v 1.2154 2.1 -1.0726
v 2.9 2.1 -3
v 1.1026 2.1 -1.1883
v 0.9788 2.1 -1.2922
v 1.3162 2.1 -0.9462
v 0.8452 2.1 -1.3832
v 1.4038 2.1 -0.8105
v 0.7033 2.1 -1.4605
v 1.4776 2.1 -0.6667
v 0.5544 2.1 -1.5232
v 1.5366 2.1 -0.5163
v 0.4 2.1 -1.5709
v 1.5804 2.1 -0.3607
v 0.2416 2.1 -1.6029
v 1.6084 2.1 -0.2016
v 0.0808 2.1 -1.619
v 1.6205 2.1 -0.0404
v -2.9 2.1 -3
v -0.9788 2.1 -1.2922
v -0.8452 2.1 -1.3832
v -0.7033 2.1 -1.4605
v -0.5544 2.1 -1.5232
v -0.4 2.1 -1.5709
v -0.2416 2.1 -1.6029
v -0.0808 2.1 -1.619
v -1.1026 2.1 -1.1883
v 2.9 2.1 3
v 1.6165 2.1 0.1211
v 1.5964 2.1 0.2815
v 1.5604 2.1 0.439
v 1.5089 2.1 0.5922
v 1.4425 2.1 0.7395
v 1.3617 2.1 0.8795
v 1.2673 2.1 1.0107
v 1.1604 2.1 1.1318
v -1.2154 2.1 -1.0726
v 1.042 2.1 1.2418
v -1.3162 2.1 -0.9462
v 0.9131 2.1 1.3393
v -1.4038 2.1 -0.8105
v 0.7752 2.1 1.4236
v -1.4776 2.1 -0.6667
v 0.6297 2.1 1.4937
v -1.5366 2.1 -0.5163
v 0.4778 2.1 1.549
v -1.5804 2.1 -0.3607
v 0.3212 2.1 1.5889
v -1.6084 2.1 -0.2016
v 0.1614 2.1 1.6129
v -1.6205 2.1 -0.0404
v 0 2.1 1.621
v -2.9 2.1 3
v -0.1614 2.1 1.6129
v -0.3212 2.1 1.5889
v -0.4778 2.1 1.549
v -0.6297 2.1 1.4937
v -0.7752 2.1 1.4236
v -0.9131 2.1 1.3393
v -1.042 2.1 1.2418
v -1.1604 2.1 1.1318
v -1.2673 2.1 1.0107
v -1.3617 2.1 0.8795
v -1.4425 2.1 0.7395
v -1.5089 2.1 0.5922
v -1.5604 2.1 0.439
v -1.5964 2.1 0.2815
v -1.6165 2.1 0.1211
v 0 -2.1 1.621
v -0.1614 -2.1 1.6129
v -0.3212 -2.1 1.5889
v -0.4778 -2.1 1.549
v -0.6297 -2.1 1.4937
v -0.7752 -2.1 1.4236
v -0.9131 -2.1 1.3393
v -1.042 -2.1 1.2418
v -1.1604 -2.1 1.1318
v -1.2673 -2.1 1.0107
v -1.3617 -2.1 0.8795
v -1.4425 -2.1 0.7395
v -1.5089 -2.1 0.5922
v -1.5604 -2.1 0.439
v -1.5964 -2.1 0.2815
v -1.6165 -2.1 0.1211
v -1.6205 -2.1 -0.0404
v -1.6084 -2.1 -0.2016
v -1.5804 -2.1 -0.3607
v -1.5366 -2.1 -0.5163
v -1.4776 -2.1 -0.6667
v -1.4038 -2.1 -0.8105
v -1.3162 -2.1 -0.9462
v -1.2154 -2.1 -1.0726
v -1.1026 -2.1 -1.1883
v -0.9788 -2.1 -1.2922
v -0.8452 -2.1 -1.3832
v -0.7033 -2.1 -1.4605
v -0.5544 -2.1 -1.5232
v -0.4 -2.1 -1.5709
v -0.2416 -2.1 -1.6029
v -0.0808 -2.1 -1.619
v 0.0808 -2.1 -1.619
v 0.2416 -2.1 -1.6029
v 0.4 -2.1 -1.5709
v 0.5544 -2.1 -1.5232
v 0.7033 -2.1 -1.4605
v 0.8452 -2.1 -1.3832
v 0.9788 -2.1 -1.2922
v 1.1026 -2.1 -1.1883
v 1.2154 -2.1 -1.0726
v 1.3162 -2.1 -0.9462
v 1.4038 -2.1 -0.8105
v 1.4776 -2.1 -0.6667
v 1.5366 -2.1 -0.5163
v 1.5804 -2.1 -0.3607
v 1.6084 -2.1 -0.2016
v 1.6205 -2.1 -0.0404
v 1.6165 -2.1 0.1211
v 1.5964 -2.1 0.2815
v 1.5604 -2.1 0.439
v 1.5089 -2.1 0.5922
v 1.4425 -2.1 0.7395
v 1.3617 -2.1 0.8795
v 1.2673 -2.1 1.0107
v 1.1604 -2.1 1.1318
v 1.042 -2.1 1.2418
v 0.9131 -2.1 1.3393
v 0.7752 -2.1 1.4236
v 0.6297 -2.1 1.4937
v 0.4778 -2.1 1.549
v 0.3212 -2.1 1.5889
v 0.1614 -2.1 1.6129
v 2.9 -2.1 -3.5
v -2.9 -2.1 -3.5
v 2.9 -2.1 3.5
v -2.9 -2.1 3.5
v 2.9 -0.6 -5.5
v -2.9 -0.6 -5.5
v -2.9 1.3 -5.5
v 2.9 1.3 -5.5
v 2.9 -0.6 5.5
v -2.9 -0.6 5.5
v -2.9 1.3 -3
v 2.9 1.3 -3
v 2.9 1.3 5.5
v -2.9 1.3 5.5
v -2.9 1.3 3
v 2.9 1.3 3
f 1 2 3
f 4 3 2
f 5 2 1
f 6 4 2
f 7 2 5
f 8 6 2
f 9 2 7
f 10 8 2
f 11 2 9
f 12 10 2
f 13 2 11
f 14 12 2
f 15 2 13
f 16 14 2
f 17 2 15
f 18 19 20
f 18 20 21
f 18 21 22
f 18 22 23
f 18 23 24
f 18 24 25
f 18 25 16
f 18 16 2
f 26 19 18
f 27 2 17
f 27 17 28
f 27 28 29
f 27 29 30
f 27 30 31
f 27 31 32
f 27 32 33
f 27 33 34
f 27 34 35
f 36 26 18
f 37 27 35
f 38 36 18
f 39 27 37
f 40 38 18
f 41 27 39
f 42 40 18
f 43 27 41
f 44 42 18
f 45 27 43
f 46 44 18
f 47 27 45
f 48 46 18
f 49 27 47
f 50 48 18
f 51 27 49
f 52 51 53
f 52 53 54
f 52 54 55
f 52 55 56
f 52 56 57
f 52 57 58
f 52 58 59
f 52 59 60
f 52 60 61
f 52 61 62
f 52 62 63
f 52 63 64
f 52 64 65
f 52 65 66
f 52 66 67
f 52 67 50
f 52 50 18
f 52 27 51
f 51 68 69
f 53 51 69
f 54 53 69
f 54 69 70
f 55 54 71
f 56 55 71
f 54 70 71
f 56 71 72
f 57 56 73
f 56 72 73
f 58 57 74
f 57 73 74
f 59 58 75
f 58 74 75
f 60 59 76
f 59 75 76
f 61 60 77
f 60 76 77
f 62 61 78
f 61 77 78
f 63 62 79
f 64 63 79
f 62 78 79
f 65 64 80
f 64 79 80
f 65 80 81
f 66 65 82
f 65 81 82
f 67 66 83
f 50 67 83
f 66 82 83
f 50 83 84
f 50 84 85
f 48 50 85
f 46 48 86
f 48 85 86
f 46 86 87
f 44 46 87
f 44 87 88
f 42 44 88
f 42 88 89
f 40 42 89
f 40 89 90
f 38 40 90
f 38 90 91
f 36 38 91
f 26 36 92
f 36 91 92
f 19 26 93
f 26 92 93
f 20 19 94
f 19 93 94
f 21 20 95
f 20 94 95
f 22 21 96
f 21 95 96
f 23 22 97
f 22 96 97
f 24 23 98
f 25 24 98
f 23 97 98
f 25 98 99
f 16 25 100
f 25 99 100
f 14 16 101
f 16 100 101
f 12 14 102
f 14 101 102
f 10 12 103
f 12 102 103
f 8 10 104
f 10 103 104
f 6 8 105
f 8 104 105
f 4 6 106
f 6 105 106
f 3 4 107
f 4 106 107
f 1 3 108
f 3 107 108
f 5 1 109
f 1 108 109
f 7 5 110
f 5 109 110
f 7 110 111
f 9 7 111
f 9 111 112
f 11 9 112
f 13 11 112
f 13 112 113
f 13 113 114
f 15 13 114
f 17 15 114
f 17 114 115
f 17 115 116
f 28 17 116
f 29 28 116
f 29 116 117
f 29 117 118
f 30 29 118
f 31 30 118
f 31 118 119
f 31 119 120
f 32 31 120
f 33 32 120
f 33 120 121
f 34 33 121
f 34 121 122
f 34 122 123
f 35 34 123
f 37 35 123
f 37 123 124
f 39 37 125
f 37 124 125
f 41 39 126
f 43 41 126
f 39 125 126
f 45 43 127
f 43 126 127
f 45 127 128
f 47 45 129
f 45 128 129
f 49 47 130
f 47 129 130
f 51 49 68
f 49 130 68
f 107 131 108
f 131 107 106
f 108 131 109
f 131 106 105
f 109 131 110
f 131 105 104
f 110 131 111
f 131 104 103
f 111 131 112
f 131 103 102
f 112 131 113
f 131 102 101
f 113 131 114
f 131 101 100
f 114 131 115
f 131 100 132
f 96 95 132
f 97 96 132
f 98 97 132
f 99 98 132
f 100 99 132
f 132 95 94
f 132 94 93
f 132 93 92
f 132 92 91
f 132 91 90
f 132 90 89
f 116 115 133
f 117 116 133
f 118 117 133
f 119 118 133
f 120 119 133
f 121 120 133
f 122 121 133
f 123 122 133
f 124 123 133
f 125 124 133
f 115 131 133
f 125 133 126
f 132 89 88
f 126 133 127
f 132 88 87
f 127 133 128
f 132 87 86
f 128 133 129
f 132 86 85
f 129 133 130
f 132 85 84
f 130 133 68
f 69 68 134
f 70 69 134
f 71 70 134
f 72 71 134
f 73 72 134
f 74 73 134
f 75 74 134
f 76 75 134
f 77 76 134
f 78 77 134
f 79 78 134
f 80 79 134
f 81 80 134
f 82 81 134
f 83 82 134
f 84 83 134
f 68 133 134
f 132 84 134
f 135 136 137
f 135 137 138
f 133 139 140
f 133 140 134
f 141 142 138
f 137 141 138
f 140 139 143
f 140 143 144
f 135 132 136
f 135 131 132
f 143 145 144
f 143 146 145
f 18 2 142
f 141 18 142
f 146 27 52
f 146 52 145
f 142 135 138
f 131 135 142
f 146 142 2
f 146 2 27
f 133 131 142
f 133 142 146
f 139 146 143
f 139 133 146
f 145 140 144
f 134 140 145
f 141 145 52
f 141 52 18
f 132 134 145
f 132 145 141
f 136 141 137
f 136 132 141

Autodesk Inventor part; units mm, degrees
ref_plane "YZ Plane" through (0, 0, 0) normal (1, 0, 0) x (0, 1, 0)
ref_plane "XZ Plane" through (0, 0, 0) normal (0, 1, 0) x (-1, 0, 0)
ref_plane "XY Plane" through (0, 0, 0) normal (0, 0, 1) x (1, 0, 0)
sketch "Sketch1" plane through (0, 0, 0) normal (0, 1, 0) x (-1, 0, 0)
  line L0 (-2.9, 5.5) -> (2.9, 5.5)
  line L1 (2.9, 5.5) -> (2.9, -5.5)
  line L2 (2.9, -5.5) -> (-2.9, -5.5)
  line L3 (-2.9, -5.5) -> (-2.9, 5.5)
  line L4 (-2.9, 5.5) -> (2.9, -5.5) construction
  line L5 (2.9, 5.5) -> (-2.9, -5.5) construction
  point P0 (0, 0)
  dimension "d0" = 11
  dimension "d1" = 5.8
extrude "Extrusion1" add sketch "Sketch1" along normal mid plane 4.2
sketch "Sketch2" plane through (2.9, -2.1, -5.5) normal (1, 0, 0) x (0, 0, -1)
  line L0 (0, 4.2) -> (0, 0) projected
  line L1 (-11, 4.2) -> (0, 4.2) projected
  line L2 (-11, 0) -> (-11, 4.2) projected
  line L3 (0, 0) -> (-11, 0) projected
  line L4 (-11, 0) -> (-11, 4.2) projected
  line L5 (-11, 1.5) -> (-9, 0)
  line L6 (0, 0) -> (-11, 0) projected
  line L7 (-2, 0) -> (0, 1.5)
  line L8 (-11, 4.2) -> (-8.5, 4.2)
  line L9 (-8.5, 4.2) -> (-8.5, 3.4)
  line L10 (-8.5, 3.4) -> (-11, 3.4)
  line L11 (-11, 3.4) -> (-11, 4.2)
  line L12 (0, 4.2) -> (-2.5, 4.2)
  line L13 (-2.5, 4.2) -> (-2.5, 3.4)
  line L14 (-2.5, 3.4) -> (0, 3.4)
  line L15 (0, 3.4) -> (0, 4.2)
  point P0 (-5.5, 2.1)
  dimension "d4" = 6
  dimension "d5" = 3
  dimension "d6" = 7
  dimension "d7" = 3.5
  dimension "d8" = 1.5
  dimension "d9" = 3.4
extrude "Extrusion2" cut sketch "Sketch2" against normal through all contours L0 L14 L13 L1 | L0 L3 L7 | L9 L10 L2 L1 | L3 L2 L5
sketch "Sketch3" plane through (0, 2.1, 0) normal (0, 1, 0) x (1, 0, 0)
  point P0 (0, 0)
  point P1 (0, 0)
hole "Hole1" at (0, 2.1, 0) direction (0, -1, 0) diameter 3.242 end through all thread size "M4x0.7" class "6H" standard "ISO Metric profile"
equation "\"d5\" = 0.5 * d4"
equation "\"d7\" = 0.5 * d6"
properties part number "RHOMBUS NUT 4"
